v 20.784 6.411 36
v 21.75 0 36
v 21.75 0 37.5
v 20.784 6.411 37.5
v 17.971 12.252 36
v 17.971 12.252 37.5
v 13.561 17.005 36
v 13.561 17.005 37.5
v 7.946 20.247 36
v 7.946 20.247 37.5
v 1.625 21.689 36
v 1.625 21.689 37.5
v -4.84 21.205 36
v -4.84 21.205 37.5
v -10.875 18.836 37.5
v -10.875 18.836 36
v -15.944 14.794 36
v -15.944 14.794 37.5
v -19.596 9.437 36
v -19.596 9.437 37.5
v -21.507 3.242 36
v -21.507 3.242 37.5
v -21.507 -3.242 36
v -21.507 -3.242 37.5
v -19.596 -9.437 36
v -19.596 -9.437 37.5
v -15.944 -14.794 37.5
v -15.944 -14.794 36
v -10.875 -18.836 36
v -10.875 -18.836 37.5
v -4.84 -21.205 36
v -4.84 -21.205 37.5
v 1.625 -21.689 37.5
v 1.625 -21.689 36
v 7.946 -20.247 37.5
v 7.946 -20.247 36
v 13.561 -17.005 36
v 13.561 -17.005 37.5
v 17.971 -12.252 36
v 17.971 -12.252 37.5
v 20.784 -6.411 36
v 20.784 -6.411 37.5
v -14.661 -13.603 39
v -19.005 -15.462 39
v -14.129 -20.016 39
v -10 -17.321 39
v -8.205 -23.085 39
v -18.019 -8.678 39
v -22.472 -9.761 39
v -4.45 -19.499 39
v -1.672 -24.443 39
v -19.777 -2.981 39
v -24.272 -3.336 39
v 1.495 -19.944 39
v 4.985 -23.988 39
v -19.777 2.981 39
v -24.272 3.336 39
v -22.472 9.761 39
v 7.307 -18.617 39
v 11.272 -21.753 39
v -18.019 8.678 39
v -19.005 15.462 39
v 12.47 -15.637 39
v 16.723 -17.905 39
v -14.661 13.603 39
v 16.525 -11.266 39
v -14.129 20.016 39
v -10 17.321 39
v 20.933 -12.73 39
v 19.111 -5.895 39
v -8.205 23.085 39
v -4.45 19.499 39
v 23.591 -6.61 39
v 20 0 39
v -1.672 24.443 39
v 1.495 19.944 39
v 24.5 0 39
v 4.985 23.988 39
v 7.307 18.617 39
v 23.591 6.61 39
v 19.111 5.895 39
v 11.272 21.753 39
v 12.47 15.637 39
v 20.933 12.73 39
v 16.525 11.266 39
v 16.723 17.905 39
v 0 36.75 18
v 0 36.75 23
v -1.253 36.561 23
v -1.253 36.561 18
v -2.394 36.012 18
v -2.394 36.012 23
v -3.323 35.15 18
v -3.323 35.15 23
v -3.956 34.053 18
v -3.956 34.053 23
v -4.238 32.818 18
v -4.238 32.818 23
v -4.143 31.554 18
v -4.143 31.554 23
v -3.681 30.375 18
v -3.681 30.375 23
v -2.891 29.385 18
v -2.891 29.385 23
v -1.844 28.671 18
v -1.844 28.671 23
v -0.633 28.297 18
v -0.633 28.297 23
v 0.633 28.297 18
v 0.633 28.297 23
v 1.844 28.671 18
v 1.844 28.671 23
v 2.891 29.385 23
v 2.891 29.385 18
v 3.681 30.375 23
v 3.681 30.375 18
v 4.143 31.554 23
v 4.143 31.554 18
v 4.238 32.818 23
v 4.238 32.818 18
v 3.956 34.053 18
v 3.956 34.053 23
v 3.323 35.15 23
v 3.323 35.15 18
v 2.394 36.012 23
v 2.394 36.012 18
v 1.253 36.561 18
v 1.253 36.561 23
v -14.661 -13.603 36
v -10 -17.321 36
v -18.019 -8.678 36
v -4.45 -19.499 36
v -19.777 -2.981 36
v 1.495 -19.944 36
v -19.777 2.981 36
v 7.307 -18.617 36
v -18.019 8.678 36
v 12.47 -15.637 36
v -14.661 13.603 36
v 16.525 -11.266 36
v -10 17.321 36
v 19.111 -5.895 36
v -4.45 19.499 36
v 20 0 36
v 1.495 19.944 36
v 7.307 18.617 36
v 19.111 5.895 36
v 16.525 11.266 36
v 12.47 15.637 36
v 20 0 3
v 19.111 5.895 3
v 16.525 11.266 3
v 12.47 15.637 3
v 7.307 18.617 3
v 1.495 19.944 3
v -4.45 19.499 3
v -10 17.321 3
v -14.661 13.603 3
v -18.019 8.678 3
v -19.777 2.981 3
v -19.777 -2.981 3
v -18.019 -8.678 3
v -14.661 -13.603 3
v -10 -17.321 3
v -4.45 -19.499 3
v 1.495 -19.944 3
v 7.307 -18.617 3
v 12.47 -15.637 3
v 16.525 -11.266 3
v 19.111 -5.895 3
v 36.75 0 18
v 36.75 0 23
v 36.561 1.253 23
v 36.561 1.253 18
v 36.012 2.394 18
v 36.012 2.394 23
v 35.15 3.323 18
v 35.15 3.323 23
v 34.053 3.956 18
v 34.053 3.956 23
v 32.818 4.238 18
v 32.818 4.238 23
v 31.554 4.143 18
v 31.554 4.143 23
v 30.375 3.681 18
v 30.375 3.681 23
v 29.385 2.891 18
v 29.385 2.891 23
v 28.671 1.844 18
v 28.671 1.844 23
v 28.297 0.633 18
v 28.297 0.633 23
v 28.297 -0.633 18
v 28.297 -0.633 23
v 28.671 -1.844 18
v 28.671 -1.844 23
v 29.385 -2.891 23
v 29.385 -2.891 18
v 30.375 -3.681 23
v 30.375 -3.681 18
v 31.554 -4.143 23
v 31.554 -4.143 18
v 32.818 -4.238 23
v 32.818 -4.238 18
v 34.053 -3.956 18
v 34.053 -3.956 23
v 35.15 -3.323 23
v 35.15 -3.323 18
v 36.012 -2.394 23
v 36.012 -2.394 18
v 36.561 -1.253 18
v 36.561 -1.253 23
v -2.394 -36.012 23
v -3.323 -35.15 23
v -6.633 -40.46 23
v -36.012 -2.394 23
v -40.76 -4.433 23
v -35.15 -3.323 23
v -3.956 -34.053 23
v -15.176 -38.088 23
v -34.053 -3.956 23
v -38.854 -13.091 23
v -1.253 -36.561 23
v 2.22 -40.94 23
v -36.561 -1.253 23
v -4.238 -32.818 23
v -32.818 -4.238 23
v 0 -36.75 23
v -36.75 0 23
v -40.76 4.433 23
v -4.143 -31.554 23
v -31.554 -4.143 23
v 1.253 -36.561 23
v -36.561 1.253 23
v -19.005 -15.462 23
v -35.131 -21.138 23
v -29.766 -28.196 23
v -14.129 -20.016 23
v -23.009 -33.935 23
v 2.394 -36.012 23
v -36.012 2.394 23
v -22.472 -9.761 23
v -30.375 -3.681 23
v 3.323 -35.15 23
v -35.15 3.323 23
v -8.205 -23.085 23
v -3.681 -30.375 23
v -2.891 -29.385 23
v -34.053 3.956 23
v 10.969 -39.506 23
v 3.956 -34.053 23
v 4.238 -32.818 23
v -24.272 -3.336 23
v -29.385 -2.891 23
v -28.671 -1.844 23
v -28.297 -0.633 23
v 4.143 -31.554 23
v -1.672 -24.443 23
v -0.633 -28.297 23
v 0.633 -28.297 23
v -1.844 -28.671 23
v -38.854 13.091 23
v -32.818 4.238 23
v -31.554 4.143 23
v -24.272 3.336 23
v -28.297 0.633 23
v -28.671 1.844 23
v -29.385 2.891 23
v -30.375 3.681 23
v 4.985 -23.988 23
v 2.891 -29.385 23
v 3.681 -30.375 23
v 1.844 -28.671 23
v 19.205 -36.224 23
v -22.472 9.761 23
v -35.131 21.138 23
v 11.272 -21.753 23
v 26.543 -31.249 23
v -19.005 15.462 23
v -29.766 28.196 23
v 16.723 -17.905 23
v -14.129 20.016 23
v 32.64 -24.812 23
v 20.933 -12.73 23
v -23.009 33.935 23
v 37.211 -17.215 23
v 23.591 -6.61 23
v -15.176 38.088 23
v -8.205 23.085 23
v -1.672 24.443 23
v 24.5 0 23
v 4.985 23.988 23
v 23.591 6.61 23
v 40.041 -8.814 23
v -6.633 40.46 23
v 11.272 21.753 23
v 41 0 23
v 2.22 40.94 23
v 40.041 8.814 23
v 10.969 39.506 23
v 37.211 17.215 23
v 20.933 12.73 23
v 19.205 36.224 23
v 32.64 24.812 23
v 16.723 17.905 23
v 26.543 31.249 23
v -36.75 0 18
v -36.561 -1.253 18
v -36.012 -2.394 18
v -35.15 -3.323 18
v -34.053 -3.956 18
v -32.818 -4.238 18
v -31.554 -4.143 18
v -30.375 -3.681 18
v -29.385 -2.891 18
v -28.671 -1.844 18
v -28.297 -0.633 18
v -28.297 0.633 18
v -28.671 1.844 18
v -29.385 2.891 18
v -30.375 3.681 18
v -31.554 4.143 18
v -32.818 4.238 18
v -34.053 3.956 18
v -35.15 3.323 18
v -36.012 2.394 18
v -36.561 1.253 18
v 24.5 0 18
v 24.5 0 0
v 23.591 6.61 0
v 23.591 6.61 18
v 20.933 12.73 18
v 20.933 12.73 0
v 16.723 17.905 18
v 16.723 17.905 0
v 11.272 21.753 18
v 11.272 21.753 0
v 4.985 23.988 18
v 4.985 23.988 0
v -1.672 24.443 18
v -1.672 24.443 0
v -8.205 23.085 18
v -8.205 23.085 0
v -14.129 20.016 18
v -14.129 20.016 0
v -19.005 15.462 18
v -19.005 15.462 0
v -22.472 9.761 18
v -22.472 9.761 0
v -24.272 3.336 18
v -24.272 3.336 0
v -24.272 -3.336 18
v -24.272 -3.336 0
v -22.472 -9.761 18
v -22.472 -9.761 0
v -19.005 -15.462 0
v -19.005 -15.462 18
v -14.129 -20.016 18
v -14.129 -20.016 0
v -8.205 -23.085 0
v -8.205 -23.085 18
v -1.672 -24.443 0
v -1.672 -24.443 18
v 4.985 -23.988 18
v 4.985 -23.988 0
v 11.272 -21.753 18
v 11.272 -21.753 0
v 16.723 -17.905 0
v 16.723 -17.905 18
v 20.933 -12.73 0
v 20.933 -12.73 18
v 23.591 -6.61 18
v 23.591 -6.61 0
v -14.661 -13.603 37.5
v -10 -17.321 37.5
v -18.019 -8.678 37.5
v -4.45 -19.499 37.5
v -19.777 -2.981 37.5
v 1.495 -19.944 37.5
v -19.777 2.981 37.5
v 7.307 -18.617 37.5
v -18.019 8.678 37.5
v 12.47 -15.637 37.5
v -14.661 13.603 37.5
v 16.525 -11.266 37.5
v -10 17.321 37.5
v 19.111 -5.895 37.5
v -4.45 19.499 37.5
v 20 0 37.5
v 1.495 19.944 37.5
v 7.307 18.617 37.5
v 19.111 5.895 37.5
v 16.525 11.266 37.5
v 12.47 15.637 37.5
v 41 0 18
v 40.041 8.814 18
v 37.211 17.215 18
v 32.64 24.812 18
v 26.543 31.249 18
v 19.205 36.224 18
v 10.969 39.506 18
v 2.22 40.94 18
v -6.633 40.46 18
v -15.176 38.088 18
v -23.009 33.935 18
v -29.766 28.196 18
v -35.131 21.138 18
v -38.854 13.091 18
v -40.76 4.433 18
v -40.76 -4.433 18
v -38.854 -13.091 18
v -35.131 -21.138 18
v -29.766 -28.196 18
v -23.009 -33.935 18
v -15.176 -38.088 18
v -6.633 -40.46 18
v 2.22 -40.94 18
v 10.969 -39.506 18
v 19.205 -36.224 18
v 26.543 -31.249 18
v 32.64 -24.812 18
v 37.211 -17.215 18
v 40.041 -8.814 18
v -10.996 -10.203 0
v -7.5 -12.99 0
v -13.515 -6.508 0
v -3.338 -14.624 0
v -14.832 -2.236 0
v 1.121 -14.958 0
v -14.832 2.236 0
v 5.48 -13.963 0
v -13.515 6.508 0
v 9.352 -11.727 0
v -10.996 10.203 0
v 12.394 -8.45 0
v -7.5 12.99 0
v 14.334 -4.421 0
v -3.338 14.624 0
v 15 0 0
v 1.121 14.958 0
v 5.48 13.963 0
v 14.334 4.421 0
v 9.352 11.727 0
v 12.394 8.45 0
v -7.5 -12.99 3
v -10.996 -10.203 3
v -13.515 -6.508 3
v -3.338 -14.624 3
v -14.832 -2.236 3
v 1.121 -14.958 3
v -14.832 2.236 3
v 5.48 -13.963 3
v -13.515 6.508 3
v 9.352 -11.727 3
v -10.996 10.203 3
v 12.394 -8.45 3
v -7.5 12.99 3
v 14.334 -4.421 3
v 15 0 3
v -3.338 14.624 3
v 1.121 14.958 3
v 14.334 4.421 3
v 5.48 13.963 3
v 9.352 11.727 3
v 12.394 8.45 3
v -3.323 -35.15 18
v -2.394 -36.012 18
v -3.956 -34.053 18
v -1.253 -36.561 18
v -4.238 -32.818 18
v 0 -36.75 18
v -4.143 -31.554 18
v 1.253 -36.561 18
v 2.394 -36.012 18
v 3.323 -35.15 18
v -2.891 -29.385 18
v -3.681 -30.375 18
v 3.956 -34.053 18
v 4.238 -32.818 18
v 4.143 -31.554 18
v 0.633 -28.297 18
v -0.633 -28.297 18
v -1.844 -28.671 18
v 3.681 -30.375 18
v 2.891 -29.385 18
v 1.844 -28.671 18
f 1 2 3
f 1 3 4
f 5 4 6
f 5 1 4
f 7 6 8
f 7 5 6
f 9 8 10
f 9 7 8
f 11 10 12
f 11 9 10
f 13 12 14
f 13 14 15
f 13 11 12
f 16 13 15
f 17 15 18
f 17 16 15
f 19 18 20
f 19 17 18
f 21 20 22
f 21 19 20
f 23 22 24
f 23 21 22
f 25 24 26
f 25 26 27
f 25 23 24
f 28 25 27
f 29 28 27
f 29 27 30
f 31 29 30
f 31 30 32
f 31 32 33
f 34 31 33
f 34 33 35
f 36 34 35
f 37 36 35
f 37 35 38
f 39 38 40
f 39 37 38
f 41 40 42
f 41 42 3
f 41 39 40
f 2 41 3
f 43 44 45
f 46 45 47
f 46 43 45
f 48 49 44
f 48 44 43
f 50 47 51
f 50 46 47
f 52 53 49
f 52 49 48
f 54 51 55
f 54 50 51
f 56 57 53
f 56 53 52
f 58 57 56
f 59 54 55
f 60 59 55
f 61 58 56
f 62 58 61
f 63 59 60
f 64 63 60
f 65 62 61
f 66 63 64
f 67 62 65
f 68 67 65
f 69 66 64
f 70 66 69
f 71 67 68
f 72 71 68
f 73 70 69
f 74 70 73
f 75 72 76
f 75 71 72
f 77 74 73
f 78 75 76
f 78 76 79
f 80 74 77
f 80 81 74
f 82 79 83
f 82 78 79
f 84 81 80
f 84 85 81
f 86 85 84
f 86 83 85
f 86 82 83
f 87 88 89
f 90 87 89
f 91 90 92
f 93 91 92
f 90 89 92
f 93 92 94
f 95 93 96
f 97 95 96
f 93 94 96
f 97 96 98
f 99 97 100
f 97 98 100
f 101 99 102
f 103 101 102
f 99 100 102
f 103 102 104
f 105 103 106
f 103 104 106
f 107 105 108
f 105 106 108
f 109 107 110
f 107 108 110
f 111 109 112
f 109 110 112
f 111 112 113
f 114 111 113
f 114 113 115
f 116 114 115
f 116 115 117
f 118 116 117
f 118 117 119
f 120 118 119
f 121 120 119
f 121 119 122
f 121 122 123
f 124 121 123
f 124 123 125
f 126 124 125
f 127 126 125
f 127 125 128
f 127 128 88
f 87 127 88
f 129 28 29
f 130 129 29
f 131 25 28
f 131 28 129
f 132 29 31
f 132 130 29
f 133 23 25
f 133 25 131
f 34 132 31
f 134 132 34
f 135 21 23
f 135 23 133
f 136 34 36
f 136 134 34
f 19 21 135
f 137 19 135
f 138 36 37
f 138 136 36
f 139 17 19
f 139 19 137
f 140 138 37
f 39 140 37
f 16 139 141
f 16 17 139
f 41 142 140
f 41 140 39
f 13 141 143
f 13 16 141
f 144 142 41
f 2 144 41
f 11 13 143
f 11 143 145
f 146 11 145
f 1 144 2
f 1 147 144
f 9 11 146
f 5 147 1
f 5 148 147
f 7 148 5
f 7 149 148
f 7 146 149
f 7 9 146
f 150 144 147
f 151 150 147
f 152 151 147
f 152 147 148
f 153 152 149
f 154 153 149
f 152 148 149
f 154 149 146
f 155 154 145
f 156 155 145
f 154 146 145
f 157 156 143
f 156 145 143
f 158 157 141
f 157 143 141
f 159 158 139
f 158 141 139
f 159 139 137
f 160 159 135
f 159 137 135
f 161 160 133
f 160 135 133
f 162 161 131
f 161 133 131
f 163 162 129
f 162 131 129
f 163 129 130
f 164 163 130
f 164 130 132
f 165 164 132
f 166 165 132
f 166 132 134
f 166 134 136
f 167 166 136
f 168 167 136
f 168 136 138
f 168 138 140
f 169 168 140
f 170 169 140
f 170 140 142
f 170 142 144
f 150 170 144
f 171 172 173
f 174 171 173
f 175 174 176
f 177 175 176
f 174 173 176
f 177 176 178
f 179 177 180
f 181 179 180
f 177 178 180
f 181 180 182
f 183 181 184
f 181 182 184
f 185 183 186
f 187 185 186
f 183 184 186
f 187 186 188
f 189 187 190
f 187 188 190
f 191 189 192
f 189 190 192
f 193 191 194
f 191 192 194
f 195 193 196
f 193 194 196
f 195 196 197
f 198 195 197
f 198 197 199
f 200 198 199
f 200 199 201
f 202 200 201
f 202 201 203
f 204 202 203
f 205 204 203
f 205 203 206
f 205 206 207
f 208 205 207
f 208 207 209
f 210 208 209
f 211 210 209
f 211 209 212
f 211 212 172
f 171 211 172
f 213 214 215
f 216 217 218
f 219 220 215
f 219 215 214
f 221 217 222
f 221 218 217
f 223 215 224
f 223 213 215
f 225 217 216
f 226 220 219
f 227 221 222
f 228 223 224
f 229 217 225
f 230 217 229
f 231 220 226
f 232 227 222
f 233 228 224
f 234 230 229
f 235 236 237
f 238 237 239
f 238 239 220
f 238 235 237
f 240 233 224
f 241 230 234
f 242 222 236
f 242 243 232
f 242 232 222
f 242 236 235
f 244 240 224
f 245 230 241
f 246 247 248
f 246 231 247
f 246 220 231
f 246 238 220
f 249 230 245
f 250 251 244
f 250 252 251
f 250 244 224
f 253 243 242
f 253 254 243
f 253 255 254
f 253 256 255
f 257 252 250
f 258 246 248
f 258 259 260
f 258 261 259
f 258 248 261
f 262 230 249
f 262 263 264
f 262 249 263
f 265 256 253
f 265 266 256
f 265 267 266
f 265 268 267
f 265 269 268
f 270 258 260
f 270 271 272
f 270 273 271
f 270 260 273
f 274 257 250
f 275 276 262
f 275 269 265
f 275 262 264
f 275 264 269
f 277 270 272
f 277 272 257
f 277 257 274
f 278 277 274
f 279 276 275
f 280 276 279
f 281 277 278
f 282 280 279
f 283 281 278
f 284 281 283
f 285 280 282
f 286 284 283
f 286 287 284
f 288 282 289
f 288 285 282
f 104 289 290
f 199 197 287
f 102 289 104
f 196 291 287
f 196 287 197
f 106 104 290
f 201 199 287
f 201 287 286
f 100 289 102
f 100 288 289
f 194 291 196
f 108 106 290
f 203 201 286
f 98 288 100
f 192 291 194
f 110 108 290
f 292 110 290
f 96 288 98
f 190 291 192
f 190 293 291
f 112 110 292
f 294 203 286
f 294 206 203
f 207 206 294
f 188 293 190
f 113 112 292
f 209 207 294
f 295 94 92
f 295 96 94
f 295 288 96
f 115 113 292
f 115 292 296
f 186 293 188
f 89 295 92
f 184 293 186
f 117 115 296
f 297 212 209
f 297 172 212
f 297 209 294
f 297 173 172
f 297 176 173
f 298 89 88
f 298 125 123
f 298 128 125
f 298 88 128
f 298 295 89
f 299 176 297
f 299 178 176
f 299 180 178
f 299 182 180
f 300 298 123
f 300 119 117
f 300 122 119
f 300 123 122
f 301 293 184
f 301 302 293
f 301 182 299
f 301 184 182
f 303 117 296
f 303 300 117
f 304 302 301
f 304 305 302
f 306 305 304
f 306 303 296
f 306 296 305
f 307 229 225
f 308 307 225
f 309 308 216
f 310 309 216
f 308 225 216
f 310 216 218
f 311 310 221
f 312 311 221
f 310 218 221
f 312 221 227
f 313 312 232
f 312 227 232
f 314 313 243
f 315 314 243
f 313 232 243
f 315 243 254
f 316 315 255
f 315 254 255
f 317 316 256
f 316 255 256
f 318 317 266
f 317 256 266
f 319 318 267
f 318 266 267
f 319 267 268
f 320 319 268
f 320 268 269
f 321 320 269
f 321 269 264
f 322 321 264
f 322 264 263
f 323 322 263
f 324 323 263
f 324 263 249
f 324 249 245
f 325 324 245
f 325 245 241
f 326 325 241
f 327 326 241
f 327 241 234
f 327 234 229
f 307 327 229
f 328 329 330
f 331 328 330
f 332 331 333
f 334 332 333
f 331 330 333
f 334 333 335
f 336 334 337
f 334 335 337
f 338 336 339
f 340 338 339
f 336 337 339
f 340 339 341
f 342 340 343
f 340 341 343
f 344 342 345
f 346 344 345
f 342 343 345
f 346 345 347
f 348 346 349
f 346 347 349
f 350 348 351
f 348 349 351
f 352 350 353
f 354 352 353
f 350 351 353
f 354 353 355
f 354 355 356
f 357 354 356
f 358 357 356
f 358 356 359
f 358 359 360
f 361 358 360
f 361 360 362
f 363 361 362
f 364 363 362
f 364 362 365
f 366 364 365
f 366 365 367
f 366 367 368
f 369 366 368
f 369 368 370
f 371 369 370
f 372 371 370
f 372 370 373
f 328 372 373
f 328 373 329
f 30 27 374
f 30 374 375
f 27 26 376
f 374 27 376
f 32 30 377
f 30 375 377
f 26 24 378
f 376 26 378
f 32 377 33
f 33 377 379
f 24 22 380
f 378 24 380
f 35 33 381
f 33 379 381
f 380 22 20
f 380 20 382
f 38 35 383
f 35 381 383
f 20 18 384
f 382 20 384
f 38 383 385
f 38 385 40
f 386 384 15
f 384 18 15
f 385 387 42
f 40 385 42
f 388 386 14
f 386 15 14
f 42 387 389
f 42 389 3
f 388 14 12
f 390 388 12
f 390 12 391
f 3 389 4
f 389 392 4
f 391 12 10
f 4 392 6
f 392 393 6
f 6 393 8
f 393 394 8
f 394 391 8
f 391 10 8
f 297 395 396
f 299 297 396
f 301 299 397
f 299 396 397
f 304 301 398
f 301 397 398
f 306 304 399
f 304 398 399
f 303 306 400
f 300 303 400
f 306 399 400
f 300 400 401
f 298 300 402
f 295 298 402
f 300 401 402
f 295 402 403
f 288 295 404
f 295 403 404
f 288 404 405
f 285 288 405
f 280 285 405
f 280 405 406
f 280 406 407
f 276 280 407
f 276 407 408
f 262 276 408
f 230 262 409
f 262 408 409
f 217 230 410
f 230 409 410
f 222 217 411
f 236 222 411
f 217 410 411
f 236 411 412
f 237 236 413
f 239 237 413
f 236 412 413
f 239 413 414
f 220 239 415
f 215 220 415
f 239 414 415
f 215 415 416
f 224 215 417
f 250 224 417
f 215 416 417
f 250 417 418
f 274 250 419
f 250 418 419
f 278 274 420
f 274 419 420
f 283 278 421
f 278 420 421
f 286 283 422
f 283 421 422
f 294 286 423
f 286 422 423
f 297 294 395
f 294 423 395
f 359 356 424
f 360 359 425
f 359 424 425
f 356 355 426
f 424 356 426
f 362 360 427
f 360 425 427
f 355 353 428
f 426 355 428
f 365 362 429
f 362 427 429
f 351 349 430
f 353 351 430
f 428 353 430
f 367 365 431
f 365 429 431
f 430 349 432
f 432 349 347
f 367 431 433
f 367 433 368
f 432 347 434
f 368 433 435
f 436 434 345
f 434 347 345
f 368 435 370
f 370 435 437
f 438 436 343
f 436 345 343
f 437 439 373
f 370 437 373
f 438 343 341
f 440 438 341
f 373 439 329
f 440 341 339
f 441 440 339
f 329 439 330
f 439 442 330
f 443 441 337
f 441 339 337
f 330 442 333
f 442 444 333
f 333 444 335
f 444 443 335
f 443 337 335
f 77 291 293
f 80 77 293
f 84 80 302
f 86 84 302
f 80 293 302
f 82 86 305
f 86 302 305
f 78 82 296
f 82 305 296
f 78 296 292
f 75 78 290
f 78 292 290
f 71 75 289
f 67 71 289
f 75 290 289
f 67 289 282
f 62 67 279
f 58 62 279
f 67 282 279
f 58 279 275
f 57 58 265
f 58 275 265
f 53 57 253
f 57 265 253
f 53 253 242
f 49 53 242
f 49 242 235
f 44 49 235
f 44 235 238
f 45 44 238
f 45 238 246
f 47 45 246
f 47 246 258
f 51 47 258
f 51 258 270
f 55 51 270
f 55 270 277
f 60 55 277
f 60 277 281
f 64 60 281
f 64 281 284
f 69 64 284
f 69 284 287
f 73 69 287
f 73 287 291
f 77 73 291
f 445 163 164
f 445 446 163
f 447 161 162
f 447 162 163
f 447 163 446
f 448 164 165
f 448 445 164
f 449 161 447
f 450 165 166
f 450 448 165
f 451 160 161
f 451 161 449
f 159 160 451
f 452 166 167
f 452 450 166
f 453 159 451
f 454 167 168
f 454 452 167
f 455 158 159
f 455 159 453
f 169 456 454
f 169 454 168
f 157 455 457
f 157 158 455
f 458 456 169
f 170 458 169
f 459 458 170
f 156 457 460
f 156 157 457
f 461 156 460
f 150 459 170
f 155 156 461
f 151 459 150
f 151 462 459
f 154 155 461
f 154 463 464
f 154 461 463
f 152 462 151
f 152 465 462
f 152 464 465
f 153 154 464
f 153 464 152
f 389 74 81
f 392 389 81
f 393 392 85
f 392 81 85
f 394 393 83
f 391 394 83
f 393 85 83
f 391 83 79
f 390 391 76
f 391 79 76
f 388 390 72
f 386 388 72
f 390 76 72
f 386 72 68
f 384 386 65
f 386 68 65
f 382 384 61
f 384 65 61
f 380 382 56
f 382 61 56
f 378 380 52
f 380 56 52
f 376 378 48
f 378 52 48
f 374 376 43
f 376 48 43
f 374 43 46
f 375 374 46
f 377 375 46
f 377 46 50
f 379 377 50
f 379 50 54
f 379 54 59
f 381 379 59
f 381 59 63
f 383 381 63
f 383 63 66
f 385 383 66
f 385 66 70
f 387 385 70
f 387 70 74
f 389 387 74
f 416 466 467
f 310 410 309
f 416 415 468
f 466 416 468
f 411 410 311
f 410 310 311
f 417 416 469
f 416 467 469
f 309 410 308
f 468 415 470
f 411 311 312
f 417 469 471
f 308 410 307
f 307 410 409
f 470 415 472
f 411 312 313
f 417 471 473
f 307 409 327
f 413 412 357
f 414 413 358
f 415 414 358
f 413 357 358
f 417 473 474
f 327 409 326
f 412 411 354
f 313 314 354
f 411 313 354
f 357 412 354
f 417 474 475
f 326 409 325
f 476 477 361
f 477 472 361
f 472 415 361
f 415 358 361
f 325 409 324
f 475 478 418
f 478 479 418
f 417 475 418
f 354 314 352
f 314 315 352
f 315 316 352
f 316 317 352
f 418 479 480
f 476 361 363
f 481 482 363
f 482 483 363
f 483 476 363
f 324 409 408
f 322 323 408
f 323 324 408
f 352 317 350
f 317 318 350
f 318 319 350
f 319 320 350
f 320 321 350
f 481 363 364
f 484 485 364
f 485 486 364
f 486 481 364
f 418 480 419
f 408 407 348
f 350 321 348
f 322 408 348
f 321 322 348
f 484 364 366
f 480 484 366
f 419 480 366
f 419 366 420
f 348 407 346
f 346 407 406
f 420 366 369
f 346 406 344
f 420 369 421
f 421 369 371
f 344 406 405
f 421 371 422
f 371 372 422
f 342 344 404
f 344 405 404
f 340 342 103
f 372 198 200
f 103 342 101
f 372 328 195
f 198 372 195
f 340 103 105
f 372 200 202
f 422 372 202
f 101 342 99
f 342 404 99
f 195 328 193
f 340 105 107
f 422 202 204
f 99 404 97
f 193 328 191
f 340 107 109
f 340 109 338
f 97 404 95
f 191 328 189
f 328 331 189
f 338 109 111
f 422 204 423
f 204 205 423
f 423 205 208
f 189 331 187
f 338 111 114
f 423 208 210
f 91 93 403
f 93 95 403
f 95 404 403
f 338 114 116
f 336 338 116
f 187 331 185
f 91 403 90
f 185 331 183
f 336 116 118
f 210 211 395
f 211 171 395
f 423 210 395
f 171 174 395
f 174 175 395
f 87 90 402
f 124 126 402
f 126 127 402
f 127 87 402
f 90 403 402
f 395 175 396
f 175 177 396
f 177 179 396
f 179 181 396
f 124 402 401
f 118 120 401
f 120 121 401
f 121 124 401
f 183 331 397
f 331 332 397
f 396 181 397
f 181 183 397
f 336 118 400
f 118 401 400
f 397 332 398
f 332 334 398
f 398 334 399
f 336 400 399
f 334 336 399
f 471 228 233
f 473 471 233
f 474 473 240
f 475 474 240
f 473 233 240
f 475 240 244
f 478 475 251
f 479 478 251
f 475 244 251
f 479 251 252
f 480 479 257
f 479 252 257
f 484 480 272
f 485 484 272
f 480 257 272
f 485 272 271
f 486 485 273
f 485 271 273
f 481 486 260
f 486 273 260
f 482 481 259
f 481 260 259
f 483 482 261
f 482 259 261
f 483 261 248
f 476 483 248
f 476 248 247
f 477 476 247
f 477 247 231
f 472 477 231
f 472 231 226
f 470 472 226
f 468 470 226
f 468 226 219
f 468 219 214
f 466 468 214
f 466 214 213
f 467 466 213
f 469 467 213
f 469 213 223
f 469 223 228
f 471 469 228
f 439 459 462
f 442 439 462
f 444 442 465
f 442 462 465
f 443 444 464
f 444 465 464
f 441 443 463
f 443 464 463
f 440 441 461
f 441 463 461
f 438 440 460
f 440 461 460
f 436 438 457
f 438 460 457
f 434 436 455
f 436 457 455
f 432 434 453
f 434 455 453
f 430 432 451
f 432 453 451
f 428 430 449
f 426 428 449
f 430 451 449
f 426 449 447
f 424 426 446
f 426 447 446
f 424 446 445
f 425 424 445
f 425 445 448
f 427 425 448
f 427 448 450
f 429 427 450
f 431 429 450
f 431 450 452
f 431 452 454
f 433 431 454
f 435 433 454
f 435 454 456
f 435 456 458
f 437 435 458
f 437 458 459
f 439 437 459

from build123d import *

# Parameters (mm, degrees)
SKETCH_1_R               = 24.5
EXTRUDE_1_DEPTH          = 39
SKETCH_2_R               = 20
CUT_EXTRUDE_1_DEPTH      = 36
SKETCH_3_R               = 15
CUT_EXTRUDE_2_DEPTH      = 50.964987741
CUT_EXTRUDE_START        = 33
SKETCH_4_R               = 21.75
CUT_EXTRUDE_3_DEPTH      = 1.5
EXTRUDE_START            = -21
SKETCH_5_R               = 41
SKETCH_5_R_2             = 24.5
EXTRUDE_2_DEPTH          = 5
SKETCH_6_R               = 4.25
CUT_EXTRUDE_4_DEPTH      = 63.377880695
PATTERN_CIRCULAR_1_COUNT = 4


with BuildPart() as part:
    # 草图1 → 凸台-拉伸1 (new body)
    with BuildSketch(Plane.XY):
        Circle(SKETCH_1_R)
    extrude(amount=EXTRUDE_1_DEPTH)

    # 草图2 → 切除-拉伸1 (cut)
    with BuildSketch(Plane.XY.offset(39)):
        Circle(SKETCH_2_R)
    extrude(amount=-CUT_EXTRUDE_1_DEPTH, mode=Mode.SUBTRACT)

    # 草图3 → 切除-拉伸2 (cut, through all)
    with BuildSketch(Plane.XY.offset(3)):
        Circle(SKETCH_3_R)
    extrude(amount=-CUT_EXTRUDE_2_DEPTH, mode=Mode.SUBTRACT)

    # 草图4 → 切除-拉伸3 (cut)
    with BuildSketch(Plane.XY.offset(3).offset(CUT_EXTRUDE_START)):
        Circle(SKETCH_4_R)
    extrude(amount=CUT_EXTRUDE_3_DEPTH, mode=Mode.SUBTRACT)

    # 草图5 → 凸台-拉伸2 (add)
    with BuildSketch(Plane.XY.offset(39).offset(EXTRUDE_START)):
        Circle(SKETCH_5_R)
        Circle(SKETCH_5_R_2, mode=Mode.SUBTRACT)
    extrude(amount=EXTRUDE_2_DEPTH)

    # 草图6 → 切除-拉伸4 (cut, through all)
    with BuildSketch(Plane.XY.offset(23)):
        with Locations((32.5, 0)):
            Circle(SKETCH_6_R)
    cut_extrude_4 = extrude(amount=-CUT_EXTRUDE_4_DEPTH, mode=Mode.SUBTRACT)

    # 阵列(圆周)1: 切除-拉伸4 ×4 about axis
    pattern_circular_1_axis = Axis((0, 0, 0), (0, 0, 1))
    for i in range(1, PATTERN_CIRCULAR_1_COUNT):
        add(cut_extrude_4.rotate(pattern_circular_1_axis, i * 360 / PATTERN_CIRCULAR_1_COUNT), mode=Mode.SUBTRACT)


solid = part.part
